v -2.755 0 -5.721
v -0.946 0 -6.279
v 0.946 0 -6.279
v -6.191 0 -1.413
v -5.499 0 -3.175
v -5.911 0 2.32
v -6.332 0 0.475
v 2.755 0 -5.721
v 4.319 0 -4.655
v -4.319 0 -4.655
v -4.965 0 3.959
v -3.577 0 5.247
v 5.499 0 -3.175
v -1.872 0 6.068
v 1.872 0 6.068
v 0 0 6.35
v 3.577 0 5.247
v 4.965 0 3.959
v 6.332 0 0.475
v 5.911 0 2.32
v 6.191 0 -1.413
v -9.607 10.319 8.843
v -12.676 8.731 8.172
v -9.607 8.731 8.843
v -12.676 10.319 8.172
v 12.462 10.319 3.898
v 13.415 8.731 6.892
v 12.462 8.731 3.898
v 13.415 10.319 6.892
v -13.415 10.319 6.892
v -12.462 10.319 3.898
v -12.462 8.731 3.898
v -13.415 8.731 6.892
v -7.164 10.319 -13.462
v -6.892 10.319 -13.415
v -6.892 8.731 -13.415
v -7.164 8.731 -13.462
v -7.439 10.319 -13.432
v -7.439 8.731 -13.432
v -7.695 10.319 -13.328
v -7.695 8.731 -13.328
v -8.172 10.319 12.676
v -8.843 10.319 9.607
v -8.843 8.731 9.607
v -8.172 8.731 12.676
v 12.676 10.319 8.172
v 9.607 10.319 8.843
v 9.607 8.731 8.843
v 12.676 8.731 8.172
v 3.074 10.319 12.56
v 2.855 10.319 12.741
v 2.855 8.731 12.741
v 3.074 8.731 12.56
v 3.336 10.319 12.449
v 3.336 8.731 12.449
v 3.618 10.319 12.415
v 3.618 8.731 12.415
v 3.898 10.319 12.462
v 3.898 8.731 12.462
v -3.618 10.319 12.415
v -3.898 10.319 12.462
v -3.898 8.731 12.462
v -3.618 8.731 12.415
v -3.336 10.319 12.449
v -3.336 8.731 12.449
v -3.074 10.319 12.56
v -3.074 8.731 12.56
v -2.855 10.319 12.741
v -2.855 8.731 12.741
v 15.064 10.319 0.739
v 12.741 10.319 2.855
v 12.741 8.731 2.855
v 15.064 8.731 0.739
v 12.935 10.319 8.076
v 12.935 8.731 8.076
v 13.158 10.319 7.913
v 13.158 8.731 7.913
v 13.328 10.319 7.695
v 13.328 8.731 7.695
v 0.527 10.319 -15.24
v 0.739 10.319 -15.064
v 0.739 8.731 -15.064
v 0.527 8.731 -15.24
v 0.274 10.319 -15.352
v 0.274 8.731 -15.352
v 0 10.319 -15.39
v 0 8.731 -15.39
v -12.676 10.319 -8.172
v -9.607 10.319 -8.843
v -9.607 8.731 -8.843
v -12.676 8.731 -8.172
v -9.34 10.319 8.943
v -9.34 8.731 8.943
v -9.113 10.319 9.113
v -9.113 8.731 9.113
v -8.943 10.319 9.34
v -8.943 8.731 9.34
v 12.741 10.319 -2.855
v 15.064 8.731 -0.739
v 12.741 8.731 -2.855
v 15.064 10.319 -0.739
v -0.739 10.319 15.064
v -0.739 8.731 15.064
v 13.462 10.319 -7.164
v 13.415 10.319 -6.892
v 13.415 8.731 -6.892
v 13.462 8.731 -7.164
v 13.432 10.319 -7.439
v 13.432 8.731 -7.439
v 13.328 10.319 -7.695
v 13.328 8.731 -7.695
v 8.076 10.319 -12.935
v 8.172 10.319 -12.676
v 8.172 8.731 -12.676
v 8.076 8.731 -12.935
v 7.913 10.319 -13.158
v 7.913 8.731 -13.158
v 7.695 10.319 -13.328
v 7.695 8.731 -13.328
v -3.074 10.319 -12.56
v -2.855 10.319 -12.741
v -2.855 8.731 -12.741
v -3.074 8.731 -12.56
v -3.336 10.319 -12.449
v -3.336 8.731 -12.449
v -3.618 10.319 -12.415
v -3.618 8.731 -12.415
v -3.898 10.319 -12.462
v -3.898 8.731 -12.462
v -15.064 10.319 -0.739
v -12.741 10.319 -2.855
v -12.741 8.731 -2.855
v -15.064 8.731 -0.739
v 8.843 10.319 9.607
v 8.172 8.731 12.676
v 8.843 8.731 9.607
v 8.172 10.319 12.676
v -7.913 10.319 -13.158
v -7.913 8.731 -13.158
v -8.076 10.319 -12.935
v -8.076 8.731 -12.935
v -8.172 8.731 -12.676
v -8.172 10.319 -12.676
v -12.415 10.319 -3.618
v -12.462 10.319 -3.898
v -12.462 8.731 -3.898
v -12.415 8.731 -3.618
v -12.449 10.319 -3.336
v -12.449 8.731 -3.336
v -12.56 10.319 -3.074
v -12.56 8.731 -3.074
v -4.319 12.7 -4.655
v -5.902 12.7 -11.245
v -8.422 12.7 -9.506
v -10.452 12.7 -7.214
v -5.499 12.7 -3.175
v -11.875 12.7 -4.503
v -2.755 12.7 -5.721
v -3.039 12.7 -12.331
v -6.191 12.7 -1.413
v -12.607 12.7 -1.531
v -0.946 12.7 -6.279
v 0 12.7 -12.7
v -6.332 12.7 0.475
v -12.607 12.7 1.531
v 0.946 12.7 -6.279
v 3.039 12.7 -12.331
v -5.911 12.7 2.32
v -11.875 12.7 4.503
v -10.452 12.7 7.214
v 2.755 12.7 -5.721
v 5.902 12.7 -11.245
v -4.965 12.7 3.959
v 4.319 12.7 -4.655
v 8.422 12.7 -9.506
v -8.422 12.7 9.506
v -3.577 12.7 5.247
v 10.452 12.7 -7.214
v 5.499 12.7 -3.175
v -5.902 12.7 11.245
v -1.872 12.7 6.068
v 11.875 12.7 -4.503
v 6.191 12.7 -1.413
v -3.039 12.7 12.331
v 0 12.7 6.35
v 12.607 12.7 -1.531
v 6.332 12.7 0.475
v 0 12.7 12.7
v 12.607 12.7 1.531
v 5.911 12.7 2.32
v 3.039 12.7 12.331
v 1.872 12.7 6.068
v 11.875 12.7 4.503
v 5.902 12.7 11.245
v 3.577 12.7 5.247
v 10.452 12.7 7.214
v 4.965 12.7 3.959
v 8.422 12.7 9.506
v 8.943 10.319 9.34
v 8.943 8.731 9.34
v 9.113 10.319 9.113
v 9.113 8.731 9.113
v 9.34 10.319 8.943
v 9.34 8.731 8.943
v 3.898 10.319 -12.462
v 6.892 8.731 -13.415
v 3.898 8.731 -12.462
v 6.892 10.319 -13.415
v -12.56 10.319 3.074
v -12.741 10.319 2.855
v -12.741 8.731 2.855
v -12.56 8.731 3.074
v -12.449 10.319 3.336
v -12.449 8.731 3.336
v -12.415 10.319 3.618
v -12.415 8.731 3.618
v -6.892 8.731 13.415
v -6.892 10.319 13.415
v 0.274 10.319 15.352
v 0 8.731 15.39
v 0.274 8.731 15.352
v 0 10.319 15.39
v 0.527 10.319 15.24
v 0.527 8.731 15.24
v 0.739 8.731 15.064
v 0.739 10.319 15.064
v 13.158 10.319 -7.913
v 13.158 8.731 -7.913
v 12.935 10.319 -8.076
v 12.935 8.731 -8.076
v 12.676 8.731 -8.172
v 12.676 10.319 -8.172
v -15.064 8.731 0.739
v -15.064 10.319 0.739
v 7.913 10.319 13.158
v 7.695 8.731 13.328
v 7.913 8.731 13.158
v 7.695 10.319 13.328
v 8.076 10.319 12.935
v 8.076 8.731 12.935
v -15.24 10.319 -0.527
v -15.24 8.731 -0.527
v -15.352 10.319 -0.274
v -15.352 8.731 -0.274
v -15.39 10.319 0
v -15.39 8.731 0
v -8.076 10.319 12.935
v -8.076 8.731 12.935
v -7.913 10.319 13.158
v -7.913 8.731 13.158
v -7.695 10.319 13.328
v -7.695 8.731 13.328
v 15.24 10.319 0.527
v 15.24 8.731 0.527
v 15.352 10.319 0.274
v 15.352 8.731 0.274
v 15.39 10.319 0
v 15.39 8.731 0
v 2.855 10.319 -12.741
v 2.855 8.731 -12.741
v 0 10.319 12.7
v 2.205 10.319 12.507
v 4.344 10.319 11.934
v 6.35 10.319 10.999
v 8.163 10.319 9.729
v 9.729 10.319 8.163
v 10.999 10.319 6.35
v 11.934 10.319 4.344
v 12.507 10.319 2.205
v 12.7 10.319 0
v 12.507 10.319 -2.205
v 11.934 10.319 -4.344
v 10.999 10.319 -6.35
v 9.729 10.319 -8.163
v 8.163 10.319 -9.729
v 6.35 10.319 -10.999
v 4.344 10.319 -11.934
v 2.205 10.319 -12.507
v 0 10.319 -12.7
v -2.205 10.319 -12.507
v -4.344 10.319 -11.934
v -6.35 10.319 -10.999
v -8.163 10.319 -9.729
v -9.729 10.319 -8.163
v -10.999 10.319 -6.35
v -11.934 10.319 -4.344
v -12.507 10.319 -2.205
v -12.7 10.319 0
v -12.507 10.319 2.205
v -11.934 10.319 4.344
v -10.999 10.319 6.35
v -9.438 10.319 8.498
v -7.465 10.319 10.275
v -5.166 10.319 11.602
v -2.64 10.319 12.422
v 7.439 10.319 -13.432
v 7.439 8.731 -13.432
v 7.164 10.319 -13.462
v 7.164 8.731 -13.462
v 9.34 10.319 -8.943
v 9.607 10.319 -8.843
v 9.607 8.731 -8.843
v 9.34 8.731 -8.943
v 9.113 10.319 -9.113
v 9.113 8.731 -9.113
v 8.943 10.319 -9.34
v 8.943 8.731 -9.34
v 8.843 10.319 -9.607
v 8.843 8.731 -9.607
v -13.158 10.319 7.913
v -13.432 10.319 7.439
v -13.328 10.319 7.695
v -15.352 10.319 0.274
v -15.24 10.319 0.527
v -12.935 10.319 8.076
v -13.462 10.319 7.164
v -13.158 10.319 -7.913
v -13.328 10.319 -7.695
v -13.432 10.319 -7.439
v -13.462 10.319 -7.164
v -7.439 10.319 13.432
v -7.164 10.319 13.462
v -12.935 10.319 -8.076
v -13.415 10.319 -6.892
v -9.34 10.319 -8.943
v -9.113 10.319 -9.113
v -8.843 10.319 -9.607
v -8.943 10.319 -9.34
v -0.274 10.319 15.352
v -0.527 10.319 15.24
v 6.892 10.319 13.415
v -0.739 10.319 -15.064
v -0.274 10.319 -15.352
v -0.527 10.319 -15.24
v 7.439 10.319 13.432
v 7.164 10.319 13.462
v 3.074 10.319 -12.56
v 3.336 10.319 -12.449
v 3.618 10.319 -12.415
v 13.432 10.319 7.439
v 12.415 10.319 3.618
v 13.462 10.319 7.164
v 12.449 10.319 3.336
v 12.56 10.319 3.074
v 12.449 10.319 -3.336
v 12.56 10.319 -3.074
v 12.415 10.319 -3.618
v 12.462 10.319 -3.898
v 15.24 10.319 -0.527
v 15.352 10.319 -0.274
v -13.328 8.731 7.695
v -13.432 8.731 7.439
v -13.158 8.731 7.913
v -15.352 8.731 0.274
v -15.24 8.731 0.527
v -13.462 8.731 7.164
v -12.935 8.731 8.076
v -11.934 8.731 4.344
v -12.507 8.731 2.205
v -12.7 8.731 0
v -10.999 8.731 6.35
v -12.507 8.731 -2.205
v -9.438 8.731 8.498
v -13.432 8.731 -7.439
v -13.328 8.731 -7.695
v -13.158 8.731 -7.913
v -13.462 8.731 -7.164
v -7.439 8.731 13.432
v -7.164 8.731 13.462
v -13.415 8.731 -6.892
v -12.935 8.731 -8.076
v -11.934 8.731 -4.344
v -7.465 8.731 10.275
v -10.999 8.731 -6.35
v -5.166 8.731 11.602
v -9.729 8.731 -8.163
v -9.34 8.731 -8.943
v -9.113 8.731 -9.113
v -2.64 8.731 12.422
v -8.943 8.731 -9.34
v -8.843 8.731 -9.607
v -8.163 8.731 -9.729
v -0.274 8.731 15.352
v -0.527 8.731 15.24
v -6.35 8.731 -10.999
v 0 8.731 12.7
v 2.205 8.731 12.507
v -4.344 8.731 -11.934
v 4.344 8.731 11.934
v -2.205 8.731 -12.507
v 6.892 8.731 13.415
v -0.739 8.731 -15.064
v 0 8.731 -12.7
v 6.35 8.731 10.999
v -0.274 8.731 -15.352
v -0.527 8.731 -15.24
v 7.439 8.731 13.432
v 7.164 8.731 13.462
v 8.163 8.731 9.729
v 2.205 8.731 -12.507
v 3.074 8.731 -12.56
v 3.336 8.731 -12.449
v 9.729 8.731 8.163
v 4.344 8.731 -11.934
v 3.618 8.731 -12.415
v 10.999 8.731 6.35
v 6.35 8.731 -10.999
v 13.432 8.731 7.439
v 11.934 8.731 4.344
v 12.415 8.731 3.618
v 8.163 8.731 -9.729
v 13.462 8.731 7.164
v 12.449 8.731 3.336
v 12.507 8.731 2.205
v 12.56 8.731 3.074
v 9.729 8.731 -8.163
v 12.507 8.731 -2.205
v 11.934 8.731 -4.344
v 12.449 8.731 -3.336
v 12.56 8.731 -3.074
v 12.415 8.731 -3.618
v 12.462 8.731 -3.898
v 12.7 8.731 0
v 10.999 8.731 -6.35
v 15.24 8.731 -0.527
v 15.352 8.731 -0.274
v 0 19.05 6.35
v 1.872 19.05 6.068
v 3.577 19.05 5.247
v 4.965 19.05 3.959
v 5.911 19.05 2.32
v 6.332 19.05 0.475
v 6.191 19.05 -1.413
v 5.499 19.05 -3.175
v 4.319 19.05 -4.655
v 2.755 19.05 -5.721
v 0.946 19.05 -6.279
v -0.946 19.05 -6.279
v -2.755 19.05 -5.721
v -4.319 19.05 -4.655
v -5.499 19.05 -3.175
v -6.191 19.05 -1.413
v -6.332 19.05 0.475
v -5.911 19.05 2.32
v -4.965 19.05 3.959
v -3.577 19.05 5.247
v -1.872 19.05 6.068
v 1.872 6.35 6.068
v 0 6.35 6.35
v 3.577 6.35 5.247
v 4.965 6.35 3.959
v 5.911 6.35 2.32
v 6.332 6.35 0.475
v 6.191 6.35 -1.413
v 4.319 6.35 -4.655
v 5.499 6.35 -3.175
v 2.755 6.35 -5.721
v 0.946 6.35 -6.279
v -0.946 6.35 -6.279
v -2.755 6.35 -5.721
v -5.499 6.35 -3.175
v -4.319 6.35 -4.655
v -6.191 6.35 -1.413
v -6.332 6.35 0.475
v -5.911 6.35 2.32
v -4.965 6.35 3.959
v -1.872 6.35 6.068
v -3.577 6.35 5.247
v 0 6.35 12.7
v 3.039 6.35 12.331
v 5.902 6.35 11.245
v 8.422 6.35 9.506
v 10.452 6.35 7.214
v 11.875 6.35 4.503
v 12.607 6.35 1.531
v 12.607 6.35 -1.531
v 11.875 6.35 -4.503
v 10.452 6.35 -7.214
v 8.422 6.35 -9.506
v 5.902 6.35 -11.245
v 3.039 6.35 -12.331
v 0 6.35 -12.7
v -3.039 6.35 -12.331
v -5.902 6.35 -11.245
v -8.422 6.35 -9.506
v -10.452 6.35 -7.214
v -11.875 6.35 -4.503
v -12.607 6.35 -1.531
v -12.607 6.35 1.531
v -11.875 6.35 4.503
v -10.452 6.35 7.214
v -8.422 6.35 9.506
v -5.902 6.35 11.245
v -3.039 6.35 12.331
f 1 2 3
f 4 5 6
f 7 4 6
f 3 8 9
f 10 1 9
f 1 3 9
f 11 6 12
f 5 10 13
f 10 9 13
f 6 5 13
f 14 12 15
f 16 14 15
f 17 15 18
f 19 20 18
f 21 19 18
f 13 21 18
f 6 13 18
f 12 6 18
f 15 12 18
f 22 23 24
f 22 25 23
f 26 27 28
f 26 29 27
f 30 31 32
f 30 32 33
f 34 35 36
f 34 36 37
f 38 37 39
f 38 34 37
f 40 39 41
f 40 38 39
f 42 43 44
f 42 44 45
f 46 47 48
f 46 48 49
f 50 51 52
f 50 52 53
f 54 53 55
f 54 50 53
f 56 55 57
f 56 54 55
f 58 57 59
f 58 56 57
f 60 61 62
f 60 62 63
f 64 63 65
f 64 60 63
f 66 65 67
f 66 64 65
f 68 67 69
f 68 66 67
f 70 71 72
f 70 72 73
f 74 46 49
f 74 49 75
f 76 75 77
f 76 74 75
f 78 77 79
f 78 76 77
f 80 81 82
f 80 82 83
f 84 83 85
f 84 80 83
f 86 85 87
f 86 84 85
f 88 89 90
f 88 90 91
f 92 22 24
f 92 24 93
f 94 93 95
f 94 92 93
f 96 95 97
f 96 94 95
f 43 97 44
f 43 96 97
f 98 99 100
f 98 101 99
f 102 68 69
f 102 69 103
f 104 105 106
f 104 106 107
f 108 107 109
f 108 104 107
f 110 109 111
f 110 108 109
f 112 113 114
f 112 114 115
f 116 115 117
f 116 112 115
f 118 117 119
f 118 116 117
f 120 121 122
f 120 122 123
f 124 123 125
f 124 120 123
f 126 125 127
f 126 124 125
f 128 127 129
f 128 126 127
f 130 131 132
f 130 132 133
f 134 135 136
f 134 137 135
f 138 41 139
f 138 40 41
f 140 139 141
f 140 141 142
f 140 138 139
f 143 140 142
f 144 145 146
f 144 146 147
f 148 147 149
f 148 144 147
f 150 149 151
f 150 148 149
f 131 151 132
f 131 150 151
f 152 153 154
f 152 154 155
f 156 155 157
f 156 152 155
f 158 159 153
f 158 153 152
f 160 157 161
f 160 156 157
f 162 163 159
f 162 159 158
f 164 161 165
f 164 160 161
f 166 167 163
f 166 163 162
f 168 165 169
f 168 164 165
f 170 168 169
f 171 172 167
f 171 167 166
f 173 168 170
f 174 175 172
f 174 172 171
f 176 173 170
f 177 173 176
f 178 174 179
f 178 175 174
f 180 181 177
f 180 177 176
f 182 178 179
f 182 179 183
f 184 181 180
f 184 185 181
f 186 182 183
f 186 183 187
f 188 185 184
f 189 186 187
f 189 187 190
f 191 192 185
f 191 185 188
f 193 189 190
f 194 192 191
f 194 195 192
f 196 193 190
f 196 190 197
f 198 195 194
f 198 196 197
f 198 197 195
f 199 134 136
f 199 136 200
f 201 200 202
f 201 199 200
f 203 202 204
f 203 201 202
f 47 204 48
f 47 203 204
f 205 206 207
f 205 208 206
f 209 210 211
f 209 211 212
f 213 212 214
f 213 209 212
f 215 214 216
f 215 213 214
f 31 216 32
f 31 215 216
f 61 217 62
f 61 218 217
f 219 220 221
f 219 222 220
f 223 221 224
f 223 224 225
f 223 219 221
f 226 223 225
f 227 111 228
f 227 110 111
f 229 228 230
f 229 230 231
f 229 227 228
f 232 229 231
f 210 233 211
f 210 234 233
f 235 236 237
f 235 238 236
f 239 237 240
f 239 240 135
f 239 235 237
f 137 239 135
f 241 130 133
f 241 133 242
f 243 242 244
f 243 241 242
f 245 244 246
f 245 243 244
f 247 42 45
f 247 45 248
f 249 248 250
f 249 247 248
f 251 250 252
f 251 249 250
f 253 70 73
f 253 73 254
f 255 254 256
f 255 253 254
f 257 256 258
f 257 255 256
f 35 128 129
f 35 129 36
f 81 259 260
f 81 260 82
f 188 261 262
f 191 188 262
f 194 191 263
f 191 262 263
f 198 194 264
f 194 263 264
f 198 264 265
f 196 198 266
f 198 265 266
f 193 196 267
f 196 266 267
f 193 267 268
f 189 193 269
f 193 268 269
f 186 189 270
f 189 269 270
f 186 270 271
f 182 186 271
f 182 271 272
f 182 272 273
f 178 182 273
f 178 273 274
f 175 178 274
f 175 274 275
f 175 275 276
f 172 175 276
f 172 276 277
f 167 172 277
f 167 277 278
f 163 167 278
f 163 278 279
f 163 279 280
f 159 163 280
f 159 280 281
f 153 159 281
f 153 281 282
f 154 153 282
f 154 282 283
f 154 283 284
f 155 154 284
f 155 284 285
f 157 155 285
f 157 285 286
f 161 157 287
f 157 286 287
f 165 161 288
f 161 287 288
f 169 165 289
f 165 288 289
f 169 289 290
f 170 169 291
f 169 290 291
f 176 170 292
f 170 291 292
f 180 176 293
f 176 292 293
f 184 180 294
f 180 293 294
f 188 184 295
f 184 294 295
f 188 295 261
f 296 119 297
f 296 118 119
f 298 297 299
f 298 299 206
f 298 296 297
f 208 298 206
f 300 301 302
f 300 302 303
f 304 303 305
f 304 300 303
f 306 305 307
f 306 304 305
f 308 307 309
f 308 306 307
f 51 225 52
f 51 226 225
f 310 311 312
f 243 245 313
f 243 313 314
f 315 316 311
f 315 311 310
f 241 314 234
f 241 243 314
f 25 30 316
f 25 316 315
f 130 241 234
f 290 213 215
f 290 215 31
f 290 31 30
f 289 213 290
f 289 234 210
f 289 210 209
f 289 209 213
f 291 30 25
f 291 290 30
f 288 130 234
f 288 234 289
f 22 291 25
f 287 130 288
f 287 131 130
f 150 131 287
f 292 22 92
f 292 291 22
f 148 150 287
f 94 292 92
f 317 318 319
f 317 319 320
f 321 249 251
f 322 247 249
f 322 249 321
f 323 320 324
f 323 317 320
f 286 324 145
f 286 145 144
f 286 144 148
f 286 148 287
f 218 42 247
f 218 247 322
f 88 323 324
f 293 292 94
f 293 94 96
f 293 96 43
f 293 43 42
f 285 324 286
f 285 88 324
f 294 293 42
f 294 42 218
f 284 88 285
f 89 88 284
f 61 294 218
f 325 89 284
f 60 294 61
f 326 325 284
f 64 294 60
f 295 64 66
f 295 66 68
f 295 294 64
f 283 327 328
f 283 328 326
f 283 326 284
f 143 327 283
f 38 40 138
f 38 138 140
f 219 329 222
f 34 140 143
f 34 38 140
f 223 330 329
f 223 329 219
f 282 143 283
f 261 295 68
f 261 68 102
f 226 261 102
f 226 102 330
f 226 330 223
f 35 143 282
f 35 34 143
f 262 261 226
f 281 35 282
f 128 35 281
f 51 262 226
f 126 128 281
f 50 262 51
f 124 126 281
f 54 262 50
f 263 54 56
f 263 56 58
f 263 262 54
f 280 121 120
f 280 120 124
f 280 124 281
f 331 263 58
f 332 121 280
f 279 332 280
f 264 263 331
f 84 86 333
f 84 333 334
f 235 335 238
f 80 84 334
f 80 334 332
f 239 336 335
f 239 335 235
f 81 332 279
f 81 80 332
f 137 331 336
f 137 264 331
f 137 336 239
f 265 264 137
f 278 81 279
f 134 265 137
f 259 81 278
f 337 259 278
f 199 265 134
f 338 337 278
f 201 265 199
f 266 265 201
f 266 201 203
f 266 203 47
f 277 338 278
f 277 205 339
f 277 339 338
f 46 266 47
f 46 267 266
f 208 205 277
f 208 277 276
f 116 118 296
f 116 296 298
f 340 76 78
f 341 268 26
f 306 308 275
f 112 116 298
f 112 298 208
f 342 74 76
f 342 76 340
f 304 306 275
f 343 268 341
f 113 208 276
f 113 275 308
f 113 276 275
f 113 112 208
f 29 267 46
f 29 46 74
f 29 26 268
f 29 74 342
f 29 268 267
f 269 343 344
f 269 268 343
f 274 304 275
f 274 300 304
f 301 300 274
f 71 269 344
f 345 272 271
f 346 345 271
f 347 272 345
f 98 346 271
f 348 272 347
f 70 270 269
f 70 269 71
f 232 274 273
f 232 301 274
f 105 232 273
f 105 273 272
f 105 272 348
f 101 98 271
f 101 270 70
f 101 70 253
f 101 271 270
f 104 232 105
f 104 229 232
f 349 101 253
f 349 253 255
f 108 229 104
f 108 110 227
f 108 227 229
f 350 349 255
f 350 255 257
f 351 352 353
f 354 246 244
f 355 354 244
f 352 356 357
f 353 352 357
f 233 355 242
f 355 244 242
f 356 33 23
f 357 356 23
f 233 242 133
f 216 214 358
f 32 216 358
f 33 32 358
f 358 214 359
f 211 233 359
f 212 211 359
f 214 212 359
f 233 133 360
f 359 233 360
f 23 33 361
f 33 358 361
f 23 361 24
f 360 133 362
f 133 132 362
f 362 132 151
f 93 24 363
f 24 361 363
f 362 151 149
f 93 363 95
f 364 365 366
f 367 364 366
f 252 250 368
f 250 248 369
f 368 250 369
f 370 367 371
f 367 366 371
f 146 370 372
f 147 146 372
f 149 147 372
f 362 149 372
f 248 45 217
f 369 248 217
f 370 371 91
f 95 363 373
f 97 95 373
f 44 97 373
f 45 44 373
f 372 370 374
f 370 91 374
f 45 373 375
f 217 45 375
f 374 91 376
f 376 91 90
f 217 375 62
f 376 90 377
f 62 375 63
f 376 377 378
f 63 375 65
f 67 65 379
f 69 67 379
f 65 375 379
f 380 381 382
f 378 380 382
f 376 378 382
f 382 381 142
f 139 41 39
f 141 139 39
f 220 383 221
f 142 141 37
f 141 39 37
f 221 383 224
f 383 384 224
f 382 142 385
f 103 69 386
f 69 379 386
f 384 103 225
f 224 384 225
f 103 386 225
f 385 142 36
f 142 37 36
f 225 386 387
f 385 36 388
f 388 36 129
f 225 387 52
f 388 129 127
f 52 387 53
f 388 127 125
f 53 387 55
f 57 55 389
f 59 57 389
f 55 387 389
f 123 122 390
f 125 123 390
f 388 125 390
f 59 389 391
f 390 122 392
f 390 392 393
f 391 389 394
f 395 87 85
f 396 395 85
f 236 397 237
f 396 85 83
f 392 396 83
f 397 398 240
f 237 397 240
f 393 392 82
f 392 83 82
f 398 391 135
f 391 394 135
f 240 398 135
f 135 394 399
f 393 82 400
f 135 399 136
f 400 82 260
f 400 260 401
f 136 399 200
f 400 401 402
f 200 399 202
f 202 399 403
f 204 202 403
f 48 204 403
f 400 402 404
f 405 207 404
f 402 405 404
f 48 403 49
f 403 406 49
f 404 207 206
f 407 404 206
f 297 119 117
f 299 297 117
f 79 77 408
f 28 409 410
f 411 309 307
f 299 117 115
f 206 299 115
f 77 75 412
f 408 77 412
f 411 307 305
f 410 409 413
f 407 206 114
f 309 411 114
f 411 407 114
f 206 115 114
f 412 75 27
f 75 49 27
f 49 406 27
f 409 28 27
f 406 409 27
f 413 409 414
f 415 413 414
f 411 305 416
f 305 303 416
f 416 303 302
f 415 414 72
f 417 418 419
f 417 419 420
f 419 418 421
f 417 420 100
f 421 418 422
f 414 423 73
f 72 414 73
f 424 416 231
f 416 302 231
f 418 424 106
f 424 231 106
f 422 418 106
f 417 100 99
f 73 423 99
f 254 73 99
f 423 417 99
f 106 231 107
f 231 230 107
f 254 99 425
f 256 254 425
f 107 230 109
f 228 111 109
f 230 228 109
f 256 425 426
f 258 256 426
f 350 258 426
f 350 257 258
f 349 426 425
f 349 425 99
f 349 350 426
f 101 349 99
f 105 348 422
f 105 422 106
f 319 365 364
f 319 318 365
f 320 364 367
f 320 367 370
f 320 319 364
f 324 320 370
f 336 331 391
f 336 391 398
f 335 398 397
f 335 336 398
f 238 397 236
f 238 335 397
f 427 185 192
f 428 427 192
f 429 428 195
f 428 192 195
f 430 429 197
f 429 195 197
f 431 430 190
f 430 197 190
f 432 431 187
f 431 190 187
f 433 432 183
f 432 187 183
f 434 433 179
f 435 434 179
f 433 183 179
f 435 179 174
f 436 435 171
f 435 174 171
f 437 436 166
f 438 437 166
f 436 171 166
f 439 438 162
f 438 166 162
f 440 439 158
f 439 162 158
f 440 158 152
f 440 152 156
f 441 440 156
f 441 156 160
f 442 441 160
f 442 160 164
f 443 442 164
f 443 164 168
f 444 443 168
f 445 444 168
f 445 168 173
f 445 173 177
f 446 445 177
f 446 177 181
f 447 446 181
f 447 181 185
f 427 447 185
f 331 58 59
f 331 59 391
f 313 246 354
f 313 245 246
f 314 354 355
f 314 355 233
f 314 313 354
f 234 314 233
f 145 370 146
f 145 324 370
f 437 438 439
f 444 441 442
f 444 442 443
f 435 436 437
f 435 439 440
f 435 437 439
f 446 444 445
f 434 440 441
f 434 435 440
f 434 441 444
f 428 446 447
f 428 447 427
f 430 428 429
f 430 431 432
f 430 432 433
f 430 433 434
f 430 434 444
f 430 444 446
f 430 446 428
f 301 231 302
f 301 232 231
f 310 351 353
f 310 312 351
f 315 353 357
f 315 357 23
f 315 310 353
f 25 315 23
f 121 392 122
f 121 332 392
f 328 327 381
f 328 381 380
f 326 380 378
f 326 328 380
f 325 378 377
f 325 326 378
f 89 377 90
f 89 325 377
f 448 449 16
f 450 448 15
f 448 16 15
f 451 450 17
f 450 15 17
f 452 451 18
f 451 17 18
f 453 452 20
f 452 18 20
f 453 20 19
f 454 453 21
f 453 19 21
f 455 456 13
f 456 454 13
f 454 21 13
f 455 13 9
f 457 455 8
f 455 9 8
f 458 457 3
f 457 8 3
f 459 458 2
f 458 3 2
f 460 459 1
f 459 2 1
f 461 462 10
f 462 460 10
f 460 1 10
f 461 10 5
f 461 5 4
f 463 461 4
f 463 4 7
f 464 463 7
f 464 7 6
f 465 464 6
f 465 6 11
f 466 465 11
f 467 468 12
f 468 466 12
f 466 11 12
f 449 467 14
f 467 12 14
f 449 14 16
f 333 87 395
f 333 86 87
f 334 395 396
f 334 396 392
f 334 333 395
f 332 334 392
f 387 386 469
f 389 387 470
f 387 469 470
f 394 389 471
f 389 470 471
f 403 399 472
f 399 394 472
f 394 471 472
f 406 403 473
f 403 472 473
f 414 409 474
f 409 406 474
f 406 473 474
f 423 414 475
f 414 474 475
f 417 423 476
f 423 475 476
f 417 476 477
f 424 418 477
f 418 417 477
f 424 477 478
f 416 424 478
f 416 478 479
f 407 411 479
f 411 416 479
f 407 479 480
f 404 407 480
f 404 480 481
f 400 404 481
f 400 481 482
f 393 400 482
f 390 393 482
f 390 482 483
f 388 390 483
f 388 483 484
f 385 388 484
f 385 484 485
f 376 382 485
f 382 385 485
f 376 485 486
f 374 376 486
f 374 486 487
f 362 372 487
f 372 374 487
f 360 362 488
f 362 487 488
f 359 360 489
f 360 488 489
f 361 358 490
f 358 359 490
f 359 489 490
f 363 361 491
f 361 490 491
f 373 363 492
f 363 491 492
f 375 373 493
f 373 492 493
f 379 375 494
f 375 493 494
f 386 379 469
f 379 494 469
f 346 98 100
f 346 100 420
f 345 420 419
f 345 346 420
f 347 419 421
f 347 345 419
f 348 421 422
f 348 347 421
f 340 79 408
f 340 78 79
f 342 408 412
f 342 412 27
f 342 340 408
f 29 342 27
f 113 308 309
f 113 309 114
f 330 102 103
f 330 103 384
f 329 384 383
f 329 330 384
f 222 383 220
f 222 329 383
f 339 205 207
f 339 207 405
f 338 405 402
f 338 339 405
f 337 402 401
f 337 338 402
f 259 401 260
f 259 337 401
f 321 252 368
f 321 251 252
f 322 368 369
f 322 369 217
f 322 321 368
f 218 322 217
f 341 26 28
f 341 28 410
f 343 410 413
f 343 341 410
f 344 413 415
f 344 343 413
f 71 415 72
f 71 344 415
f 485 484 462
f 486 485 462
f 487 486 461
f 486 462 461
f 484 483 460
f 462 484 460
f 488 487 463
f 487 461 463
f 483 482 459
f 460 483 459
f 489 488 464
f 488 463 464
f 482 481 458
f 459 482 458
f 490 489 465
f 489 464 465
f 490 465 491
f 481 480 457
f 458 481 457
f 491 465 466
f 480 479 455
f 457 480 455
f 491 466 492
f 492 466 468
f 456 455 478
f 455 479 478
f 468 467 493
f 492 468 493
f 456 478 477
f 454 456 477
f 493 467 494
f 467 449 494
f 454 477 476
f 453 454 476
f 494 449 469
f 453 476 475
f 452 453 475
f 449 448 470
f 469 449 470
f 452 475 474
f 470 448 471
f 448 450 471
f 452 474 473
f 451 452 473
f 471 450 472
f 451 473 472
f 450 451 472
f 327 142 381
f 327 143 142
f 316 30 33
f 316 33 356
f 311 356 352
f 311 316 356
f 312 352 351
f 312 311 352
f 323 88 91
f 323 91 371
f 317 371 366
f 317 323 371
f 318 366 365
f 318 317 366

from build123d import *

# Parameters (mm, degrees)
SKETCH1_R           = 6.35
BOSS_EXTRUDE1_DEPTH = 19.05
BOSS_EXTRUDE2_START = 6.35
SKETCH2_R           = 12.7
BOSS_EXTRUDE2_DEPTH = 6.35
BOSS_EXTRUDE3_DEPTH = 0.79375
CIRPATTERN1_COUNT   = 12


with BuildPart() as part:
    # Sketch1 → Boss-Extrude1 (new body)
    with BuildSketch(Plane(origin=(0, 0, 0), x_dir=(1, 0, 0), z_dir=(0, 1, 0))):
        with Locations(Location((0, 0, 0), (0, 0, 270))):
            Circle(SKETCH1_R)
    extrude(amount=BOSS_EXTRUDE1_DEPTH)

    # Sketch2 → Boss-Extrude2 (add)
    with BuildSketch(Plane(origin=(0, 0, 0), x_dir=(1, 0, 0), z_dir=(0, 1, 0)).offset(BOSS_EXTRUDE2_START)):
        with Locations(Location((0, 0, 0), (0, 0, 270))):
            Circle(SKETCH2_R)
    extrude(amount=BOSS_EXTRUDE2_DEPTH)

    # Sketch3 → Boss-Extrude3 (add, symmetric)
    with BuildSketch(Plane(origin=(0, 9.525, 0), x_dir=(1, 0, 0), z_dir=(0, 1, 0))):
        with BuildLine():
            Line((-6.891666757, -13.415120246), (-3.89786608, -12.461780366))
            ThreePointArc((-3.89786608, -12.461780366), (-3.335621729, -12.448709767), (-2.855239137, -12.741151414))
            Line((-2.855239137, -12.741151414), (-0.739201637, -15.063668306))
            ThreePointArc((-0.739201637, -15.063668306), (-0.404051866, -15.304920203), (0, -15.390184127))
            Line((0, -15.390184127), (0, -12.7))
            Line((0, -12.7), (-6.35, -10.998522628))
            Line((-6.35, -10.998522628), (-7.695092063, -13.328290423))
            ThreePointArc((-7.695092063, -13.328290423), (-7.302540921, -13.456475632), (-6.891666757, -13.415120246))
        make_face()
    boss_extrude3 = extrude(amount=BOSS_EXTRUDE3_DEPTH, both=True)

    # CirPattern1: Boss-Extrude3 ×12 about axis
    cirpattern1_axis = Axis((0, 0, 0), (0, 1, 0))
    for i in range(1, CIRPATTERN1_COUNT):
        add(boss_extrude3.rotate(cirpattern1_axis, i * 360 / CIRPATTERN1_COUNT))


solid = part.part
